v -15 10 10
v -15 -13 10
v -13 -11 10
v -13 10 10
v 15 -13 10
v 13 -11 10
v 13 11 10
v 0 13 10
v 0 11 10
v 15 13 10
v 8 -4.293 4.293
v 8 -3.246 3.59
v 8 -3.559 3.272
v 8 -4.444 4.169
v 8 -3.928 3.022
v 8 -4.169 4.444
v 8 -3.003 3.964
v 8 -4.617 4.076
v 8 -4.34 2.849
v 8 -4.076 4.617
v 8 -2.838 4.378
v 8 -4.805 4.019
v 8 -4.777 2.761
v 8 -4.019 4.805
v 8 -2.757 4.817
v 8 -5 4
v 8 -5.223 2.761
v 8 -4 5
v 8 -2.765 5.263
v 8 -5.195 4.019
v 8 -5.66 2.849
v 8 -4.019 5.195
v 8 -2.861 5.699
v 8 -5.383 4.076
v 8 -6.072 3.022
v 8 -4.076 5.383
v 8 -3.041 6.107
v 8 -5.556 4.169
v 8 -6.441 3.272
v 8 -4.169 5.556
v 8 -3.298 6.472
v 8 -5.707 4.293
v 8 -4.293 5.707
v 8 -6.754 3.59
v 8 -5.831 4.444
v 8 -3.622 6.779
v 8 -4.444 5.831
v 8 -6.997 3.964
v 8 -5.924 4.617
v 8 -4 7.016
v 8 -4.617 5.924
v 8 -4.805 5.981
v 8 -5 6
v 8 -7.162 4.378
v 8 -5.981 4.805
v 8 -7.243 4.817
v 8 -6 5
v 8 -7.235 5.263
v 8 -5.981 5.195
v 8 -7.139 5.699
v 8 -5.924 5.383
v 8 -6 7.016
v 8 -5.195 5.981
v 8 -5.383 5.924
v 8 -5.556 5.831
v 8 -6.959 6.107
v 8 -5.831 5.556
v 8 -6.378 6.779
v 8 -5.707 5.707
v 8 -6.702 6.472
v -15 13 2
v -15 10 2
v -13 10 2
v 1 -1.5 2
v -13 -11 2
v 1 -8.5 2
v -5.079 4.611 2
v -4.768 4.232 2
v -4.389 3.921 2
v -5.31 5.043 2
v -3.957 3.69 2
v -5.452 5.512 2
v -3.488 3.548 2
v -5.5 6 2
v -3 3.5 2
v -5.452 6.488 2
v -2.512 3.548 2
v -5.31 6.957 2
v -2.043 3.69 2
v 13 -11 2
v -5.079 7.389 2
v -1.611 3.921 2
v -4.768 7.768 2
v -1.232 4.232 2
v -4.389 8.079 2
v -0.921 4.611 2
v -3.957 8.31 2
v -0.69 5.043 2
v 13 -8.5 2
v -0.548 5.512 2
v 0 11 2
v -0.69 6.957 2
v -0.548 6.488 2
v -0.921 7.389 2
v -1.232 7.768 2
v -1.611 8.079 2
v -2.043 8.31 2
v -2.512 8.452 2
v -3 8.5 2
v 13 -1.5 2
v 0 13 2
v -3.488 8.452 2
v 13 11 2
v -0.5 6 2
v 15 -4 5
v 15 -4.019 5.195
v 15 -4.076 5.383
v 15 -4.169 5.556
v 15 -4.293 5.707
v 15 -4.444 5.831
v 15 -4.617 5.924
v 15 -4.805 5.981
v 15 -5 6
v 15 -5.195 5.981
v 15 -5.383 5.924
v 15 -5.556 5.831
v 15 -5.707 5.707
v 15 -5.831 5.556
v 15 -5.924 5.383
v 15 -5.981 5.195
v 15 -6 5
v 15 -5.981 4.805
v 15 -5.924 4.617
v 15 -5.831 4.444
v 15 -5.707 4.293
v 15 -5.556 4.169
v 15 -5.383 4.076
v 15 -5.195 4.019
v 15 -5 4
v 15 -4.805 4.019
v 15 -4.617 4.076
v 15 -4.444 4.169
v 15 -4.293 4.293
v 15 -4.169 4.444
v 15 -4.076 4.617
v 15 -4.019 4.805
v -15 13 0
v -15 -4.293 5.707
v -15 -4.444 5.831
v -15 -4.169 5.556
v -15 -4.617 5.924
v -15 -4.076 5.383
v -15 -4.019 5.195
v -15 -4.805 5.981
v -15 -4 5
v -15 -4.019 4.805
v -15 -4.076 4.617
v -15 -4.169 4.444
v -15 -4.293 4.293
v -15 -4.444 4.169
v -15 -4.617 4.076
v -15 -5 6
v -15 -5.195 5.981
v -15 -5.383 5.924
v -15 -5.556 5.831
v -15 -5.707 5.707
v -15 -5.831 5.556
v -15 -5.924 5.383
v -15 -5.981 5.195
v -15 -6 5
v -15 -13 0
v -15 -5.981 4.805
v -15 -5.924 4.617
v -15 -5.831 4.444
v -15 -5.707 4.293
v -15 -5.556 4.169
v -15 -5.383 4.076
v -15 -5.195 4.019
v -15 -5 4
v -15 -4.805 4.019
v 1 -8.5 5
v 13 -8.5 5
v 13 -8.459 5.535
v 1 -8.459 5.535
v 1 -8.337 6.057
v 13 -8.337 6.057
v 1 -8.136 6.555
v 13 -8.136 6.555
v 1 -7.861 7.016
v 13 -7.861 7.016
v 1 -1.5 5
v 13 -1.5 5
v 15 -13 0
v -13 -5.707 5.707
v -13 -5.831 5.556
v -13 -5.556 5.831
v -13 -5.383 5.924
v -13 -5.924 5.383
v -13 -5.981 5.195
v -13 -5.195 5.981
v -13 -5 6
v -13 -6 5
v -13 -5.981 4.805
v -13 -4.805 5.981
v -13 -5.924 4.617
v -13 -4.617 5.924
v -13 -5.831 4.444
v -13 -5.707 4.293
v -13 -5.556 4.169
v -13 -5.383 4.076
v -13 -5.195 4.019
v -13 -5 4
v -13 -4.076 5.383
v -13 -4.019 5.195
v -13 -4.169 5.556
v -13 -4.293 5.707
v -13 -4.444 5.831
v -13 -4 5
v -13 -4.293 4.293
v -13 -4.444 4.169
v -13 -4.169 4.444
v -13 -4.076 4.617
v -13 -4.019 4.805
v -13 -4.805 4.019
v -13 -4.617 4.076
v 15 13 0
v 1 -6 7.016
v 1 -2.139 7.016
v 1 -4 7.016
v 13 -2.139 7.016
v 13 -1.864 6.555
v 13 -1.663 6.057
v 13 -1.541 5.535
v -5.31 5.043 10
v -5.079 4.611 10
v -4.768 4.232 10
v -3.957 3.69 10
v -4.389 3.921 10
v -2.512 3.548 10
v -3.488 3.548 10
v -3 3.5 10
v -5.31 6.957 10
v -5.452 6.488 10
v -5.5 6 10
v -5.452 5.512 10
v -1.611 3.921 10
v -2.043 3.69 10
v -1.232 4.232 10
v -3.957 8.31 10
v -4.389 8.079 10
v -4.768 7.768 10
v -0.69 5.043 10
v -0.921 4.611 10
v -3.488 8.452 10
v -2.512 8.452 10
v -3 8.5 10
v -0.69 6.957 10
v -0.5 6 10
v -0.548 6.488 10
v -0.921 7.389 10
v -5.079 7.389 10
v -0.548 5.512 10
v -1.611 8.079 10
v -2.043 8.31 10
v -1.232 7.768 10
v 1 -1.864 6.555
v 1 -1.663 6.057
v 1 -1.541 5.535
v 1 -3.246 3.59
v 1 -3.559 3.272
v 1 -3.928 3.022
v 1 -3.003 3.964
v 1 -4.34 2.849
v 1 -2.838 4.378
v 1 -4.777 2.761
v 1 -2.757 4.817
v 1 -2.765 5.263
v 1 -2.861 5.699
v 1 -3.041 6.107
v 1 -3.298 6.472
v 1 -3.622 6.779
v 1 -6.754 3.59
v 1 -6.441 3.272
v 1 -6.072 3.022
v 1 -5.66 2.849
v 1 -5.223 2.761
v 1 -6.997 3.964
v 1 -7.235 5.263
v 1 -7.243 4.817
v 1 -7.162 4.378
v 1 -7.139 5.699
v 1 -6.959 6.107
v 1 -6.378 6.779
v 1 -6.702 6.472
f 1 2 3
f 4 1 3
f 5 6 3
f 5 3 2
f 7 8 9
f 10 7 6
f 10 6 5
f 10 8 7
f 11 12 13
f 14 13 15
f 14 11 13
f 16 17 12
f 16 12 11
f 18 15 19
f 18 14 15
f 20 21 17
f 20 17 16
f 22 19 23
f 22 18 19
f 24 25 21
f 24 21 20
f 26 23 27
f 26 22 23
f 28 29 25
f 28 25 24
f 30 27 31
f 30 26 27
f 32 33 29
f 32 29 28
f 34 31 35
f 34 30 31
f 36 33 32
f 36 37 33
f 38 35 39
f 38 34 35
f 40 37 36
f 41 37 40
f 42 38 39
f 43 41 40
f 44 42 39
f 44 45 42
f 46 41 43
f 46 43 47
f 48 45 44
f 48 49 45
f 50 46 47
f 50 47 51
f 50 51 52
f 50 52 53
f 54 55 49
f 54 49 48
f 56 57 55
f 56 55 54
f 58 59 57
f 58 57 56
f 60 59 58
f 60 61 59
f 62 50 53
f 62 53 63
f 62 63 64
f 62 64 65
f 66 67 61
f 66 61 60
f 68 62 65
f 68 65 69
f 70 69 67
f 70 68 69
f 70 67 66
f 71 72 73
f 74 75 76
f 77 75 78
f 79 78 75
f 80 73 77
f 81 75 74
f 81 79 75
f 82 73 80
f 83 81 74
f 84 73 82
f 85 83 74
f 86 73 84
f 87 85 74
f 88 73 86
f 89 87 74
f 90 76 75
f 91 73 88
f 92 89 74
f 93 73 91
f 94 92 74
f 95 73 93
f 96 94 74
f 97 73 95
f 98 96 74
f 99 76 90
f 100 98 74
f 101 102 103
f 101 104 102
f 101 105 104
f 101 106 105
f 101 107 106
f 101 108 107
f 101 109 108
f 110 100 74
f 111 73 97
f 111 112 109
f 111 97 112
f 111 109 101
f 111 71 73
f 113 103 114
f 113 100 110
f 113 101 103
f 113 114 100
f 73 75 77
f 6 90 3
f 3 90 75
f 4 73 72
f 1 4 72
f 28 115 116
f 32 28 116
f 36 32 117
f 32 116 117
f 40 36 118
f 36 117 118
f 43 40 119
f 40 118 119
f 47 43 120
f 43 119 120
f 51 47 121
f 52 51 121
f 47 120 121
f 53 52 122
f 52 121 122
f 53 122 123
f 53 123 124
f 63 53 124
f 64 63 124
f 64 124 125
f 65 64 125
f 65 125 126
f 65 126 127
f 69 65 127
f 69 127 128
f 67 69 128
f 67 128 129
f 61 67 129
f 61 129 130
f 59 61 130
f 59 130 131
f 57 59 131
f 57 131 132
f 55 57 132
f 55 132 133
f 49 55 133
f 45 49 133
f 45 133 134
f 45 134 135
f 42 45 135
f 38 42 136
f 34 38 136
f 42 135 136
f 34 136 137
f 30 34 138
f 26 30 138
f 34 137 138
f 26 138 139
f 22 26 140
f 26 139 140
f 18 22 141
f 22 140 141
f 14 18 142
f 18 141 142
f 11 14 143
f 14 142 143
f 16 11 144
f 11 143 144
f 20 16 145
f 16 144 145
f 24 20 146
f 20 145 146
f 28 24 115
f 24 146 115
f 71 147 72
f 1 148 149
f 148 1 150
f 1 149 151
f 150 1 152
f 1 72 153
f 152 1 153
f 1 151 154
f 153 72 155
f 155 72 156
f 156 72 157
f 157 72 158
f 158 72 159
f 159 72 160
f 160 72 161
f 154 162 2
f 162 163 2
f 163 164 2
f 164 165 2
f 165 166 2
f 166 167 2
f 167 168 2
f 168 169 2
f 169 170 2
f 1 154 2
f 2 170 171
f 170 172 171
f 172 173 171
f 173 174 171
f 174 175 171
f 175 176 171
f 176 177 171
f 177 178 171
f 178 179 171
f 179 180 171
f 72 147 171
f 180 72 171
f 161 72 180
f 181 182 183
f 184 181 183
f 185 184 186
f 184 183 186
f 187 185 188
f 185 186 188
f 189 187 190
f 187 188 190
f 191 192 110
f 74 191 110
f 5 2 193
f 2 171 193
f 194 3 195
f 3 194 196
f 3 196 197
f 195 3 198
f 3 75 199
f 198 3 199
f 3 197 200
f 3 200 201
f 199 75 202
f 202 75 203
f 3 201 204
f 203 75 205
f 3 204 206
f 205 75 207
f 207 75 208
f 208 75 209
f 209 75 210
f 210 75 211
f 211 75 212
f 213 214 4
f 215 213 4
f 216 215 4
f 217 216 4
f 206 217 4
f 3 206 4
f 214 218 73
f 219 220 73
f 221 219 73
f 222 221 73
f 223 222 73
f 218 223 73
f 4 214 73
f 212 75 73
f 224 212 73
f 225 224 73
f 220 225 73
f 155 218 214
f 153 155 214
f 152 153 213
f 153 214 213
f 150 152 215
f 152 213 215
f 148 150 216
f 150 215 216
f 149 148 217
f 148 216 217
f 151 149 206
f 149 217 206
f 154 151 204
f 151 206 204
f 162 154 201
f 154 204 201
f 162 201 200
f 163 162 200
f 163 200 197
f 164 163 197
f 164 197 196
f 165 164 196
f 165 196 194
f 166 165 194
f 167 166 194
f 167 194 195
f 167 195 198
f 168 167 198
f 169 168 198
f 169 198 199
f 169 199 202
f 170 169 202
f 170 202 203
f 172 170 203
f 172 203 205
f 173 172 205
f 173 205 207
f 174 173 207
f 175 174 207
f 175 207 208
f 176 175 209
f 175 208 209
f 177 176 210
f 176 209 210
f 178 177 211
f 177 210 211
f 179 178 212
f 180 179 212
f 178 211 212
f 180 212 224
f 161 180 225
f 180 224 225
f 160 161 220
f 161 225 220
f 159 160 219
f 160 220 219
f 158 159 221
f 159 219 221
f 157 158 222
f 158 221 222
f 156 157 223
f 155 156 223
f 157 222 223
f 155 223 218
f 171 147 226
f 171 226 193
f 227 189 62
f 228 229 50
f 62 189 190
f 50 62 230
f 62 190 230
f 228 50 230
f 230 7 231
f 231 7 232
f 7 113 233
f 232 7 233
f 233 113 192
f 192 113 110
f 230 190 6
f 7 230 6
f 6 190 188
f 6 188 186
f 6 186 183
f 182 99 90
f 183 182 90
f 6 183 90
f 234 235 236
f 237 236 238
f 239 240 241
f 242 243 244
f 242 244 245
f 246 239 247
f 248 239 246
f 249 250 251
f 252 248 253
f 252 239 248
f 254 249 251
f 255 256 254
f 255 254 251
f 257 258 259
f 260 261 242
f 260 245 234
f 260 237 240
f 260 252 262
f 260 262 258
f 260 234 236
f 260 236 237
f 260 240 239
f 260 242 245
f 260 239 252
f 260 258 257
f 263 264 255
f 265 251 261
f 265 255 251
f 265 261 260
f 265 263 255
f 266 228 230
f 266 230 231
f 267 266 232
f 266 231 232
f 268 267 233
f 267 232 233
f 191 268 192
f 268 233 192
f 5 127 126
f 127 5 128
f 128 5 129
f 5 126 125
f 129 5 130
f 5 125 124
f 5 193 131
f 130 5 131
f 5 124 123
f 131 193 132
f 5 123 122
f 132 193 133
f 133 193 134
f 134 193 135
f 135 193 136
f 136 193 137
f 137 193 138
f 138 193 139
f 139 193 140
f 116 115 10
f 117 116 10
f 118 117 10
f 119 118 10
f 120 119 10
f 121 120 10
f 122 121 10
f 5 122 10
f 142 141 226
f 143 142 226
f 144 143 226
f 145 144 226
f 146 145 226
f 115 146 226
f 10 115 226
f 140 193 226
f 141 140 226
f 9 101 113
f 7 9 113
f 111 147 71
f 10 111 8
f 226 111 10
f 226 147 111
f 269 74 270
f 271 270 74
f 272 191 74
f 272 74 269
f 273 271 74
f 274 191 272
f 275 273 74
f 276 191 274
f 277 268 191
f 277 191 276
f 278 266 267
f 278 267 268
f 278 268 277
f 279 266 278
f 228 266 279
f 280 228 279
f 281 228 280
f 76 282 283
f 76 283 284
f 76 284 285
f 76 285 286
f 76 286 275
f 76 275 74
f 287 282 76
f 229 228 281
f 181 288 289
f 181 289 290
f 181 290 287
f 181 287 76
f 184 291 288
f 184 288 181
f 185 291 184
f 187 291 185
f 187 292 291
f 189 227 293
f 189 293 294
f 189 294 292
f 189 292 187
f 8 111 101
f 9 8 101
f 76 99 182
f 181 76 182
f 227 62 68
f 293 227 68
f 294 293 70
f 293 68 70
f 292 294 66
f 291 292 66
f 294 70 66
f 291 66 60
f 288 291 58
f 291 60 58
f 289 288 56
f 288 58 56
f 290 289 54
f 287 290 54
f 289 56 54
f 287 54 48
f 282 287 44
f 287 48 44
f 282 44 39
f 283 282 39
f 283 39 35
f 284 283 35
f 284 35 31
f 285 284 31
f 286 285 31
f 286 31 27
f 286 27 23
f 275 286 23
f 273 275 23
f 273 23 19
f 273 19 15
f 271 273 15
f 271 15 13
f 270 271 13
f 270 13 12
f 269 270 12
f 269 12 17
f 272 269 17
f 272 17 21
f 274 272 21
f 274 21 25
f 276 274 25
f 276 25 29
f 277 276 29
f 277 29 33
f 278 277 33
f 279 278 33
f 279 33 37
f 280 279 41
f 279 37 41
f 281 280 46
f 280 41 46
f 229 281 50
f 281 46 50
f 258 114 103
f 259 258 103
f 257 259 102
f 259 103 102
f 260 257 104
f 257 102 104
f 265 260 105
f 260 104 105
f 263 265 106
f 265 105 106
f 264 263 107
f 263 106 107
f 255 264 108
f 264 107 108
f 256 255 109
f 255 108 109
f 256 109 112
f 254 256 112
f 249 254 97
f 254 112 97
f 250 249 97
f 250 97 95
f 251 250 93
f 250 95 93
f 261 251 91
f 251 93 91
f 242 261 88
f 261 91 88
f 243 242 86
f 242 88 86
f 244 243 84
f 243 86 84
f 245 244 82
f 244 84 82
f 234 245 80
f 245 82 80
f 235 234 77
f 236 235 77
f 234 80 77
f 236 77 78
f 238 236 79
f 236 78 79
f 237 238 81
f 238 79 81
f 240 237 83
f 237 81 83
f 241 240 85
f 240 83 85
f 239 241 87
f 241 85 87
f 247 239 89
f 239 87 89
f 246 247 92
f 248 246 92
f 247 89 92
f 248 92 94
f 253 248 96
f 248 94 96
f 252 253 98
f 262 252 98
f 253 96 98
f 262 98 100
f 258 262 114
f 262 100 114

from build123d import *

# Parameters (mm, degrees)
F0_W      = 30
F0_H      = 26
F1_DEPTH  = 2
F3_DEPTH  = 8
F4_R      = 2.5
F5_DEPTH  = 8
F7_DEPTH  = 12
F9_DEPTH  = 5
F10_R     = 1
F11_DEPTH = 30.001


with BuildPart() as f1:
    # F0 (on Top) → F1 (new body)
    with BuildSketch(Plane.XY):
        Rectangle(F0_W, F0_H)
    extrude(amount=F1_DEPTH)

    # F2 (on face) → F3 (join)
    with BuildSketch(Plane.XY.offset(2)):
        Polygon((-15, 10), (-15, -13), (15, -13), (15, 13), (0, 13), (0, 11), (13, 11), (13, -11), (-13, -11), (-13, 10), align=None)
    extrude(amount=F3_DEPTH)

    # F4 (on face) → F5 (join, through all)
    with BuildSketch(Plane.XY.offset(2)):
        with Locations((-3, 6)):
            Circle(F4_R)
    extrude(amount=F5_DEPTH)

    # F6 (on face) → F7 (join)
    with BuildSketch(Plane(origin=(13, 0, 0), x_dir=(0, -1, 0), z_dir=(-1, 0, 0))):
        with BuildLine():
            Line((8.5, 0), (8.5, 5))
            ThreePointArc((8.5, 5), (8.3365275924, 6.0571582782), (7.8613807856, 7.0155644371))
            Line((7.8613807856, 7.0155644371), (6, 7.0155644371))
            ThreePointArc((6, 7.0155644371), (5, 2.75), (4, 7.0155644371))
            Line((4, 7.0155644371), (2.1386192144, 7.0155644371))
            ThreePointArc((2.1386192144, 7.0155644371), (1.6634724076, 6.0571582782), (1.5, 5))
            Line((1.5, 5), (1.5, 0))
            Line((1.5, 0), (8.5, 0))
        make_face()
    extrude(amount=F7_DEPTH)

    # F8 (on face) → F9 (join)
    with BuildSketch(Plane(origin=(13, 0, 0), x_dir=(0, -1, 0), z_dir=(-1, 0, 0))):
        with BuildLine():
            Line((1.5, 2), (8.5, 2))
            Line((8.5, 2), (8.5, 5))
            ThreePointArc((8.5, 5), (8.3365275924, 6.0571582782), (7.8613807856, 7.0155644371))
            Line((7.8613807856, 7.0155644371), (2.1386192144, 7.0155644371))
            ThreePointArc((2.1386192144, 7.0155644371), (1.6634724076, 6.0571582782), (1.5, 5))
            Line((1.5, 5), (1.5, 2))
        make_face()
    extrude(amount=F9_DEPTH)

    # F10 (on face) → F11 (cut, through all)
    with BuildSketch(Plane.YZ.offset(15)):
        with Locations((-5, 5)):
            Circle(F10_R)
    extrude(amount=-F11_DEPTH, mode=Mode.SUBTRACT)


solid = f1.part
